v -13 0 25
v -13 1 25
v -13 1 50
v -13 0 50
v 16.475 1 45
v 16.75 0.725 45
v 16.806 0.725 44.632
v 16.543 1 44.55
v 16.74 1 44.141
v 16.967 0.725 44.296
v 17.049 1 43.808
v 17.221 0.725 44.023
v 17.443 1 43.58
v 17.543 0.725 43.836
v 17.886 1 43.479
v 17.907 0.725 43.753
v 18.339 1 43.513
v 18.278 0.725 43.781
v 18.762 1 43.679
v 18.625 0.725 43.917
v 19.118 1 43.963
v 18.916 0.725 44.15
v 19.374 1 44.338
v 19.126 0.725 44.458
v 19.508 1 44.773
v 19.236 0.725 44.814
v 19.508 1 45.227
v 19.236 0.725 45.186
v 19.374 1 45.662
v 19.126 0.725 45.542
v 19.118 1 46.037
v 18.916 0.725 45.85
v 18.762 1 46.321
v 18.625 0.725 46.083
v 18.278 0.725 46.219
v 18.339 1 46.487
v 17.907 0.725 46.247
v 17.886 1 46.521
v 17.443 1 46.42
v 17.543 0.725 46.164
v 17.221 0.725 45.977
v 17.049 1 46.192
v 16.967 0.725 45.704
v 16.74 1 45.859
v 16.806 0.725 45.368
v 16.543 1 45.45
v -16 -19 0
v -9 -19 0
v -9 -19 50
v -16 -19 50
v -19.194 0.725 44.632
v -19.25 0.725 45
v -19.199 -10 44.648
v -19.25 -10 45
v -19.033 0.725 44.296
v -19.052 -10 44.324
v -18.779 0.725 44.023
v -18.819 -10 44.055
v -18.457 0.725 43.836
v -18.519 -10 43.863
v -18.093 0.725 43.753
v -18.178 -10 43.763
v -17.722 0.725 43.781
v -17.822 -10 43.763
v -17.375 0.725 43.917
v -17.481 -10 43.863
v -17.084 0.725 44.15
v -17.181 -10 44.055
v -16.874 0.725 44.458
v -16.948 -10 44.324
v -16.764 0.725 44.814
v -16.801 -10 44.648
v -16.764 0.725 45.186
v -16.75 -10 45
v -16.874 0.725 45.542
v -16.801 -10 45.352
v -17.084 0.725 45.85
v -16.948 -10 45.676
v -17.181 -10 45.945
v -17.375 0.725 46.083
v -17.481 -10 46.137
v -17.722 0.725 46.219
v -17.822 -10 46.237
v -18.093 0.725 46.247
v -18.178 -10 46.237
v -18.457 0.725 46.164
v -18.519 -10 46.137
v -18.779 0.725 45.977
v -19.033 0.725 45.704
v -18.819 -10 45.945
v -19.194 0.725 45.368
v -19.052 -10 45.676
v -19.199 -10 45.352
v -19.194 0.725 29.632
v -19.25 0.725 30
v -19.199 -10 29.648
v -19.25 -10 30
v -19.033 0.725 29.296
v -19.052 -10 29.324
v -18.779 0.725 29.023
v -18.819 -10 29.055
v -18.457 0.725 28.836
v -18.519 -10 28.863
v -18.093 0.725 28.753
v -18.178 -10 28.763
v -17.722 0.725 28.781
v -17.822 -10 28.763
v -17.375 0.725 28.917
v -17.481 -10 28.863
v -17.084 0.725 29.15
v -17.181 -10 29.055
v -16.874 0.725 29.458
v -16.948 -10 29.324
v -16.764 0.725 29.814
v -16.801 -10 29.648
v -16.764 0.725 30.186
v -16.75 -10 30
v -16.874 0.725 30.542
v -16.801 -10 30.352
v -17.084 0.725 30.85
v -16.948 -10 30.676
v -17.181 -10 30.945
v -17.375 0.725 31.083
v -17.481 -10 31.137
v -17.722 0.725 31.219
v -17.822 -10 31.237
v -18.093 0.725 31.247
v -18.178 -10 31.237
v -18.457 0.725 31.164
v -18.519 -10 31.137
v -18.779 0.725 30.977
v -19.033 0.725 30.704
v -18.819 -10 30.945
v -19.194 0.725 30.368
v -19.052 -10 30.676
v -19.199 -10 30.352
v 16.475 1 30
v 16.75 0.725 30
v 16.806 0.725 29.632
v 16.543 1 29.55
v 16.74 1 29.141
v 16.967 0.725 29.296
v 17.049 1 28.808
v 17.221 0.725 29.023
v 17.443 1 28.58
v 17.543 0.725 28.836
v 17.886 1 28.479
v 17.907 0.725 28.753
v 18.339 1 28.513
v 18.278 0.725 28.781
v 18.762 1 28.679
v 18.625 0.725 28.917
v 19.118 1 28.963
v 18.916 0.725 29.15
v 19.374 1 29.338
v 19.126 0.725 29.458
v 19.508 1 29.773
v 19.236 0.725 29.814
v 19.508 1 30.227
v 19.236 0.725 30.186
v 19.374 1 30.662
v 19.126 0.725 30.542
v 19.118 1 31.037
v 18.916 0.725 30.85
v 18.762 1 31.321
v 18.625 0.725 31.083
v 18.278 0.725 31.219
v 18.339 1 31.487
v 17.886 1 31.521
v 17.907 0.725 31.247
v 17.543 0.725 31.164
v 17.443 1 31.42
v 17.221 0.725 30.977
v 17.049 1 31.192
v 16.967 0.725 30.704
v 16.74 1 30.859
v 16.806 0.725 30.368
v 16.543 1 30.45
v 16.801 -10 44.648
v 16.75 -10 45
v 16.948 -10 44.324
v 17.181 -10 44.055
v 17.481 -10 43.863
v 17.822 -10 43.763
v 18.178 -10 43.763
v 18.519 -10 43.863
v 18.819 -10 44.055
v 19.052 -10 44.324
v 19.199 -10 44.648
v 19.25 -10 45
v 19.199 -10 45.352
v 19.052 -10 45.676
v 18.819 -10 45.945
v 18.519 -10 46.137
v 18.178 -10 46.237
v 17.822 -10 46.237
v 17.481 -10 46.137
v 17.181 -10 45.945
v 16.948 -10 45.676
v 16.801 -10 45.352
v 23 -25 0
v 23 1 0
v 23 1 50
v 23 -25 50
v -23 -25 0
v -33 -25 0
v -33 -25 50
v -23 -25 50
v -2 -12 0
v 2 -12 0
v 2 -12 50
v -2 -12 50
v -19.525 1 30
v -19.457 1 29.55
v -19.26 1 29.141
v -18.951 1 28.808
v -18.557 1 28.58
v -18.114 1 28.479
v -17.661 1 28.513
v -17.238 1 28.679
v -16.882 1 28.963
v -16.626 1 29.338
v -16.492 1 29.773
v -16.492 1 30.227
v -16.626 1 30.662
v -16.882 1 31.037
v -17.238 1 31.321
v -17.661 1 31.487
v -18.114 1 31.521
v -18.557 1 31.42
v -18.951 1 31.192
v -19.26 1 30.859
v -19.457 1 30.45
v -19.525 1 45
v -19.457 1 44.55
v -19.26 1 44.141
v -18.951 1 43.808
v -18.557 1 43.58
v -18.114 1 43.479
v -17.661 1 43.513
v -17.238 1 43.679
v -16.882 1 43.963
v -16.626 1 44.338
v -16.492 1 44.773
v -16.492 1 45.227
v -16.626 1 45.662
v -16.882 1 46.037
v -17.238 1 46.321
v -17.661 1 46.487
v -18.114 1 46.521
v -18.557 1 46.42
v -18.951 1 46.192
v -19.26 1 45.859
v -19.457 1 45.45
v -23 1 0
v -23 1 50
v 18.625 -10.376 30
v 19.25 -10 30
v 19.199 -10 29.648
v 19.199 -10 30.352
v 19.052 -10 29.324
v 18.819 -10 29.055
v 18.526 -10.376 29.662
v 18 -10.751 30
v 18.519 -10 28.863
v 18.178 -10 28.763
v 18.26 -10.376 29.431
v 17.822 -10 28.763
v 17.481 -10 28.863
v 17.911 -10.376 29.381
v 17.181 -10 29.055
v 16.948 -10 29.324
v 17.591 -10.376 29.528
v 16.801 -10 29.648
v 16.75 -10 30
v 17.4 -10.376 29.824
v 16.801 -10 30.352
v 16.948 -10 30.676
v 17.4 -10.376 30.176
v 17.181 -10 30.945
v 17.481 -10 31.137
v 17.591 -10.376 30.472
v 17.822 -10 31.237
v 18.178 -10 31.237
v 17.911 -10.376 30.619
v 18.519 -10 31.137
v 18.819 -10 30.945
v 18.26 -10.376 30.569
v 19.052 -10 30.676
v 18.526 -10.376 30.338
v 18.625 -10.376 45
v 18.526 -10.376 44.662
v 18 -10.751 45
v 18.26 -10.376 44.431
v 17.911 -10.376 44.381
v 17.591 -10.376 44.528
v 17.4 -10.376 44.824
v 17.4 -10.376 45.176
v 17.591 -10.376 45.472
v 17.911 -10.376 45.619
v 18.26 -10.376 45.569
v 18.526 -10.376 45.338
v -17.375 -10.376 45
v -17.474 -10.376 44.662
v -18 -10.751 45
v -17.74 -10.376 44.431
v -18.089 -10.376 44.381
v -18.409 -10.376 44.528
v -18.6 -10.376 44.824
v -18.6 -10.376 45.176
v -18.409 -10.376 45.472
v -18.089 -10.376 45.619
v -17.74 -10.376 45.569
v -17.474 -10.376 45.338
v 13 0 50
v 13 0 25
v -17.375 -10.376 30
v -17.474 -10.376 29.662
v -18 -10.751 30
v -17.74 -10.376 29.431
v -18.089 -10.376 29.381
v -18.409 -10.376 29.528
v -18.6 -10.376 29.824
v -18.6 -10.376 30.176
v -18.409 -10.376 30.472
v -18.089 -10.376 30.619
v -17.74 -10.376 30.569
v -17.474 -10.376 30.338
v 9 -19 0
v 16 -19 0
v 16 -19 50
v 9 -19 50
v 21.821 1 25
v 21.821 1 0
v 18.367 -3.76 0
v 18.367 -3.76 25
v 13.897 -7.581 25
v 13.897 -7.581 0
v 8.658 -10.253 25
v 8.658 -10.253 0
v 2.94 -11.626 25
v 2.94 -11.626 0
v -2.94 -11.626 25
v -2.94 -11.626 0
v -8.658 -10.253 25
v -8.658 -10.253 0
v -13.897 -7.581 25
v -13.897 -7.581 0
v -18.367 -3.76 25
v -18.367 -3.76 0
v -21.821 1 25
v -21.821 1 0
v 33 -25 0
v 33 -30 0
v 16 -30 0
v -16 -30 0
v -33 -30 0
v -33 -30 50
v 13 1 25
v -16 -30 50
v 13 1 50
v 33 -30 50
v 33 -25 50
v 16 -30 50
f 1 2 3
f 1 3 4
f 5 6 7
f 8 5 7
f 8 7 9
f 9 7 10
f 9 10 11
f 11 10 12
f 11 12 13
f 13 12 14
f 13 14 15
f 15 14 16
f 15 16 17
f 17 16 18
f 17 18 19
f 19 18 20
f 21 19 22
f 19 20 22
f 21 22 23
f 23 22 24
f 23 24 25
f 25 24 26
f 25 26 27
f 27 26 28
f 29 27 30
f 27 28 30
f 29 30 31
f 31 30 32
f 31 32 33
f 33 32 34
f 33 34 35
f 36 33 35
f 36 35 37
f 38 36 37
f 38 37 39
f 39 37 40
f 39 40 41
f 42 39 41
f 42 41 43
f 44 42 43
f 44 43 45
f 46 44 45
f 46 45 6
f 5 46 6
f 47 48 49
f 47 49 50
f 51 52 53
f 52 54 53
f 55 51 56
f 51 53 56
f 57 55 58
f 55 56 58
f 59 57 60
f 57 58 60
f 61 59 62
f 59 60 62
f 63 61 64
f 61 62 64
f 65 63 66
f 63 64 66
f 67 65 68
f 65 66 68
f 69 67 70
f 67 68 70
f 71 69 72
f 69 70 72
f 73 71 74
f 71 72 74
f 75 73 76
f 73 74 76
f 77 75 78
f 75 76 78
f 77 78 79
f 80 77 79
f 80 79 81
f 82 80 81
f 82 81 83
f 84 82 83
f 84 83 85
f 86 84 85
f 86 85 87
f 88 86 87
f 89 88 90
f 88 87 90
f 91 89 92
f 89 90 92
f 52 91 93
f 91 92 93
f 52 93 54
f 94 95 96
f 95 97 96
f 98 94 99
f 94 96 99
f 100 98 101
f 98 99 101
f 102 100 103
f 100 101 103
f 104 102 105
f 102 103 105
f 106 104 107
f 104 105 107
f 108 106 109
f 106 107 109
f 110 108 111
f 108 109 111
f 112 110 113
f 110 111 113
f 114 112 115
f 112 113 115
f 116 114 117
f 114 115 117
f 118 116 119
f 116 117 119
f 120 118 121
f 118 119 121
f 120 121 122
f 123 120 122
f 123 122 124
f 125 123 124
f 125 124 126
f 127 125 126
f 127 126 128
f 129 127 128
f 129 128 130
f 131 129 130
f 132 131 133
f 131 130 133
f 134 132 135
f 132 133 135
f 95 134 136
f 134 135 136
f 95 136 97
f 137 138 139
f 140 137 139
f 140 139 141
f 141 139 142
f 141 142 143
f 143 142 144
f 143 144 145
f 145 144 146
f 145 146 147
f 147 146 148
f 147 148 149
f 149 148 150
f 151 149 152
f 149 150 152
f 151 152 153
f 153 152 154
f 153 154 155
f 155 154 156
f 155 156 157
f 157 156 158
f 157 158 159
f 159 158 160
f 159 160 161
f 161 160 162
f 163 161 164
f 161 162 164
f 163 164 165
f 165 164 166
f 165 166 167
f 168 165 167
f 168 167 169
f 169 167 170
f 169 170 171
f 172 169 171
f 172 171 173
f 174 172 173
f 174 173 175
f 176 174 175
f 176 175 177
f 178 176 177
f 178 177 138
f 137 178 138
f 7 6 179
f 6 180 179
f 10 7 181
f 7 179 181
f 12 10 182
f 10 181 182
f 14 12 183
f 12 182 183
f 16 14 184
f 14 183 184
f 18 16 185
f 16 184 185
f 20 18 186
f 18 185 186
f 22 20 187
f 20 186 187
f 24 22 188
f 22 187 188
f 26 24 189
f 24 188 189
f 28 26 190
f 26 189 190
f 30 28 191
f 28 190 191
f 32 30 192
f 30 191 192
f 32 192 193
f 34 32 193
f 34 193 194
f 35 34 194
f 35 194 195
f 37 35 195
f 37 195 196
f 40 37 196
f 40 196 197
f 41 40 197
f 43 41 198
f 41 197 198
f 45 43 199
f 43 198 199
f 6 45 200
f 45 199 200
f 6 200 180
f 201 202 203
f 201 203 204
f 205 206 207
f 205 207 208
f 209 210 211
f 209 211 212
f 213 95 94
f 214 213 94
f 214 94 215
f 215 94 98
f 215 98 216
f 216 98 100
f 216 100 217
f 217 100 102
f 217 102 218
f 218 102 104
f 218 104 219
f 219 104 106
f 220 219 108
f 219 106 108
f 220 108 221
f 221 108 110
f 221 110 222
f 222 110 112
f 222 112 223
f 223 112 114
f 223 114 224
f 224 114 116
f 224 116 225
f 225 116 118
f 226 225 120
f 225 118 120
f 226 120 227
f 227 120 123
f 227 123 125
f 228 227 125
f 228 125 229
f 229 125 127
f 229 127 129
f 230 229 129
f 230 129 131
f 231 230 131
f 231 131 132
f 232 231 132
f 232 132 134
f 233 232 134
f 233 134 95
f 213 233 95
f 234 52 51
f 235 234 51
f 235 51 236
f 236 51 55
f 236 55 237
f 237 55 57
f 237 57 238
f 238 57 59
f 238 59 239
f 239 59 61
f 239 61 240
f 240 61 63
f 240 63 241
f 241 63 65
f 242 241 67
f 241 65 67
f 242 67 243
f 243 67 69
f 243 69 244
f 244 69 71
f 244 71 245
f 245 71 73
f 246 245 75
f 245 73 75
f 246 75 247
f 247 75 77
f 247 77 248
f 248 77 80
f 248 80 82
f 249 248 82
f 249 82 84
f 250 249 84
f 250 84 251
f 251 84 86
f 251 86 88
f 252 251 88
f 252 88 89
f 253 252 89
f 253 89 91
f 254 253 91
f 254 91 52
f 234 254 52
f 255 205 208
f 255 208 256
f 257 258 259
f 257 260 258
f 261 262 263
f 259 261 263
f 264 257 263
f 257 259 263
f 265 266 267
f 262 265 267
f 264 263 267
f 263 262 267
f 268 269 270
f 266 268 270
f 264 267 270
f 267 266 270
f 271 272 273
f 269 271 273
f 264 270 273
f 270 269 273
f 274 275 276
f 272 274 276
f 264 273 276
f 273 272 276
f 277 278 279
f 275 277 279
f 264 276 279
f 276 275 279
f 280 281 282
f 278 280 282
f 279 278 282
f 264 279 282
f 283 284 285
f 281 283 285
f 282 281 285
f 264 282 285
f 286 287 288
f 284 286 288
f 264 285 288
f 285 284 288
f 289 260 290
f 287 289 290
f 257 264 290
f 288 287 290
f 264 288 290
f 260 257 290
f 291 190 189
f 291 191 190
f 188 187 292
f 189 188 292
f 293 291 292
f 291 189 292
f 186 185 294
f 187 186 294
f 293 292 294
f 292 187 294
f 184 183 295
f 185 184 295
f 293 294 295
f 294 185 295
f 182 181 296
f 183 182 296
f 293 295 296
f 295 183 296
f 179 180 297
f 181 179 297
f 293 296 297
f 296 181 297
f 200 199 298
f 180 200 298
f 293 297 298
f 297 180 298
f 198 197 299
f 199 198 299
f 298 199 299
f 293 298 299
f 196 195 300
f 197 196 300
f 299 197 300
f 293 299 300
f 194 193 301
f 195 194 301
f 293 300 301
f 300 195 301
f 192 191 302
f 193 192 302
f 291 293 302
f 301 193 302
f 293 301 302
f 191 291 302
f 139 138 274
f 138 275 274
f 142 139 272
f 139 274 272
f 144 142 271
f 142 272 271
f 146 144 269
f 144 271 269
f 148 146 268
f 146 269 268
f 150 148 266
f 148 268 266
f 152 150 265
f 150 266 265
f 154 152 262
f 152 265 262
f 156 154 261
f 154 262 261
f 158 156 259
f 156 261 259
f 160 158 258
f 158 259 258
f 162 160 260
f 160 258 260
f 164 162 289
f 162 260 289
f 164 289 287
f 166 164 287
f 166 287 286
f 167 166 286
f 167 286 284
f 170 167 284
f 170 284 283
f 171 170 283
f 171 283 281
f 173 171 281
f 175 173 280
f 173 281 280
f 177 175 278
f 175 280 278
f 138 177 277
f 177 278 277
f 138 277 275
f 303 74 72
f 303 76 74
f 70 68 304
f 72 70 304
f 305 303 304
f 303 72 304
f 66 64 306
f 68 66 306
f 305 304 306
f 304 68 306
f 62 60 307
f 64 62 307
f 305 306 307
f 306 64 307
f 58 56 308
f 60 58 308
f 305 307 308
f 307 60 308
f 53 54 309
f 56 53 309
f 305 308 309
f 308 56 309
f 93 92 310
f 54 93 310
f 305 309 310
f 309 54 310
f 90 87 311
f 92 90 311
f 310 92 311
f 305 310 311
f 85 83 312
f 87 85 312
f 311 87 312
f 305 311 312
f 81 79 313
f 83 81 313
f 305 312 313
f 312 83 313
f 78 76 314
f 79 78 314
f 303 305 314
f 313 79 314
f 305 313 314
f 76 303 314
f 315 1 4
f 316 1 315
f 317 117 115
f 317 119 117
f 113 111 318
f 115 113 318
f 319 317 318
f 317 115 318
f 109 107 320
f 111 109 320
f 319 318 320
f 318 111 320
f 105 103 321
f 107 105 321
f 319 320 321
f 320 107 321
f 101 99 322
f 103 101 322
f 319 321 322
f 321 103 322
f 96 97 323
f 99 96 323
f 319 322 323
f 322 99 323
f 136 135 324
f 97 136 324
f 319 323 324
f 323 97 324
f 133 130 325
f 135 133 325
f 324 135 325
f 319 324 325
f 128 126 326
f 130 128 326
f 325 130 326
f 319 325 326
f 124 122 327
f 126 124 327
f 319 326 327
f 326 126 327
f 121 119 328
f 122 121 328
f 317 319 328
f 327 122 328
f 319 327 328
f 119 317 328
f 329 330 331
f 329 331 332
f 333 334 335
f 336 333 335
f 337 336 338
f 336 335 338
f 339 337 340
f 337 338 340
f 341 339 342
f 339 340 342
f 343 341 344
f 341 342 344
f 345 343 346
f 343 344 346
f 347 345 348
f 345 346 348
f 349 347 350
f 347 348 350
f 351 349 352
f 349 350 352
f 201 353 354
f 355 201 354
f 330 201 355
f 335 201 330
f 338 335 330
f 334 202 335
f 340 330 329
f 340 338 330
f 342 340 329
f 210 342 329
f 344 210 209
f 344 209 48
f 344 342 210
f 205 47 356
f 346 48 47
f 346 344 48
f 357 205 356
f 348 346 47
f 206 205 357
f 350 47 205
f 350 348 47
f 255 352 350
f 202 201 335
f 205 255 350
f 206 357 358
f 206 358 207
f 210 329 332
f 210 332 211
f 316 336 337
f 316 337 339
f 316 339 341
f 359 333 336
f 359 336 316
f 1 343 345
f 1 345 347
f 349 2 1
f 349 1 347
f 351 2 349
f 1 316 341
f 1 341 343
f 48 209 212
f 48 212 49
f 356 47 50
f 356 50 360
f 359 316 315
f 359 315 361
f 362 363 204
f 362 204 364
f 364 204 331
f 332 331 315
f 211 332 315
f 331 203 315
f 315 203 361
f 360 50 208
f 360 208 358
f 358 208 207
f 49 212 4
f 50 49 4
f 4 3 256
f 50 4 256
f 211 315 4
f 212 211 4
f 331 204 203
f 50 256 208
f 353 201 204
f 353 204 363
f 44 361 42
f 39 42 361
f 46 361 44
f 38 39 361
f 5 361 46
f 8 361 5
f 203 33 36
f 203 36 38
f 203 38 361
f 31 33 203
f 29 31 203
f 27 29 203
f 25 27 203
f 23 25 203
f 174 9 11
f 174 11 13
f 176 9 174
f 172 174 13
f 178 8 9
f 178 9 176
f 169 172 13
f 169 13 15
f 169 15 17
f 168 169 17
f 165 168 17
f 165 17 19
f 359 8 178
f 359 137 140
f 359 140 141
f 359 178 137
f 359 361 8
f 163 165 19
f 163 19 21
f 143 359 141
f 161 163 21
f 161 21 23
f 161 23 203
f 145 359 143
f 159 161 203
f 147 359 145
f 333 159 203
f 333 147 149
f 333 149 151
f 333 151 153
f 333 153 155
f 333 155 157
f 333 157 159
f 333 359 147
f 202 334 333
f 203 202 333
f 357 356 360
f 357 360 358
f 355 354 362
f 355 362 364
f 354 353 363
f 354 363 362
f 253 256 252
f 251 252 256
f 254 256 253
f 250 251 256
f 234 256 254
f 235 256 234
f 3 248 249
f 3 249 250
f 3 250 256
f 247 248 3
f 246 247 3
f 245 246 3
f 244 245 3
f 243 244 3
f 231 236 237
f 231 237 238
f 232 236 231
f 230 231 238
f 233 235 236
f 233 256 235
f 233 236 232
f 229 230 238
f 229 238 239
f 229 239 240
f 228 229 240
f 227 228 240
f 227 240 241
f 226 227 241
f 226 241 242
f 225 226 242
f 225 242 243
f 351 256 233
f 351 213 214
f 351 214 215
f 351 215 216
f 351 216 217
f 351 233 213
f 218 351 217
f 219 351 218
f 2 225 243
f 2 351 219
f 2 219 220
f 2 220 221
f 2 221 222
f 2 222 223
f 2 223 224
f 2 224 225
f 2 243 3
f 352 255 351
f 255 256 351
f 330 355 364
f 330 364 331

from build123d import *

# Parameters (mm, degrees)
BOSS_EXTRUDE1_DEPTH             = 50
SKETCH2_R                       = 25
CUT_EXTRUDE1_DEPTH              = 25
M3X0_5_TAPPED_HOLE1_D           = 2.5
M3X0_5_TAPPED_HOLE1_DEPTH       = 11
M3X0_5_TAPPED_HOLE1_CSINK_D     = 3.05
M3X0_5_TAPPED_HOLE1_CSINK_ANGLE = 90
M3X0_5_TAPPED_HOLE1_TIP         = 0.751075774


with BuildPart() as part:
    # Sketch1 → Boss-Extrude1 (new body)
    with BuildSketch(Plane.XY):
        Polygon((-13, 0), (13, 0), (13, 1), (23, 1), (23, -25), (33, -25), (33, -30), (16, -30), (16, -19), (9, -19), (2, -12), (-2, -12), (-9, -19), (-16, -19), (-16, -30), (-33, -30), (-33, -25), (-23, -25), (-23, 1), (-13, 1), align=None)
    extrude(amount=BOSS_EXTRUDE1_DEPTH)

    # Sketch2 → Cut-Extrude1 (cut)
    with BuildSketch(Plane(origin=(0, 0, 0), x_dir=(-1, 0, 0), z_dir=(0, 0, -1))):
        with Locations((0, 13.2)):
            Circle(SKETCH2_R)
    extrude(amount=-CUT_EXTRUDE1_DEPTH, mode=Mode.SUBTRACT)

    # M3x0.5 Tapped Hole1
    with Locations(Plane(origin=(0, 1, 0), x_dir=(1, 0, 0), z_dir=(0, 1, 0))):
        with Locations((-18, -30), (-18, -45), (18, -30), (18, -45)):
            CounterSinkHole(M3X0_5_TAPPED_HOLE1_D / 2, M3X0_5_TAPPED_HOLE1_CSINK_D / 2, depth=M3X0_5_TAPPED_HOLE1_DEPTH, counter_sink_angle=M3X0_5_TAPPED_HOLE1_CSINK_ANGLE)
            with Locations((0, 0, -(M3X0_5_TAPPED_HOLE1_DEPTH + M3X0_5_TAPPED_HOLE1_TIP / 2))):  # 118° drill point
                Cone(0, M3X0_5_TAPPED_HOLE1_D / 2, M3X0_5_TAPPED_HOLE1_TIP, mode=Mode.SUBTRACT)


solid = part.part
